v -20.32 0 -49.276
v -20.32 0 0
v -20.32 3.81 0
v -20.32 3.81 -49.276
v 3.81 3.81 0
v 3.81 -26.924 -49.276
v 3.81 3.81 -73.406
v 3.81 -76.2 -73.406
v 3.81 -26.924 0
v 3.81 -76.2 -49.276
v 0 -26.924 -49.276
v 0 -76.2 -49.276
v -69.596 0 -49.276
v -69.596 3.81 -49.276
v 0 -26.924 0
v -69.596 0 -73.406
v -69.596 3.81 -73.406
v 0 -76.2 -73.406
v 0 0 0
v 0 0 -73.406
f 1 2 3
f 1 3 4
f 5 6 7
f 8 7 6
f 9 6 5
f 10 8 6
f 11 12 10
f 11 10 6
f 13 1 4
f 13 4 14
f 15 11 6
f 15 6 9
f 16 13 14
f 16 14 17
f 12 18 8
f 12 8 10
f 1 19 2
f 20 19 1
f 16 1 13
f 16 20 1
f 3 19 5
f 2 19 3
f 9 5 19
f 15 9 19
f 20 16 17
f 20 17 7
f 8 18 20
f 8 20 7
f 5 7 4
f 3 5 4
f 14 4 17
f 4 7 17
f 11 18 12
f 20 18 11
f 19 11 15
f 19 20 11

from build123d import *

# Parameters (mm, degrees)
BOSS_EXTRUDE1_DEPTH = 3.81
BOSS_EXTRUDE2_DEPTH = 3.81


with BuildPart() as part:
    # Sketch2 → Boss-Extrude1 (new body)
    with BuildSketch(Plane(origin=(0, 0, 0), x_dir=(0, 0, -1), z_dir=(1, 0, 0))):
        Polygon((0, 0), (73.406, 0), (73.406, -76.2), (49.276, -76.2), (49.276, -26.924), (0, -26.924), align=None)
    extrude(amount=BOSS_EXTRUDE1_DEPTH)

    # Sketch5 → Boss-Extrude2 (add)
    with BuildSketch(Plane(origin=(0, 0, 0), x_dir=(1, 0, 0), z_dir=(0, 1, 0))):
        Polygon((-69.596, 73.406), (3.81, 73.406), (3.81, 0), (-20.32, 0), (-20.32, 49.276), (-69.596, 49.276), align=None)
    extrude(amount=BOSS_EXTRUDE2_DEPTH)


solid = part.part
